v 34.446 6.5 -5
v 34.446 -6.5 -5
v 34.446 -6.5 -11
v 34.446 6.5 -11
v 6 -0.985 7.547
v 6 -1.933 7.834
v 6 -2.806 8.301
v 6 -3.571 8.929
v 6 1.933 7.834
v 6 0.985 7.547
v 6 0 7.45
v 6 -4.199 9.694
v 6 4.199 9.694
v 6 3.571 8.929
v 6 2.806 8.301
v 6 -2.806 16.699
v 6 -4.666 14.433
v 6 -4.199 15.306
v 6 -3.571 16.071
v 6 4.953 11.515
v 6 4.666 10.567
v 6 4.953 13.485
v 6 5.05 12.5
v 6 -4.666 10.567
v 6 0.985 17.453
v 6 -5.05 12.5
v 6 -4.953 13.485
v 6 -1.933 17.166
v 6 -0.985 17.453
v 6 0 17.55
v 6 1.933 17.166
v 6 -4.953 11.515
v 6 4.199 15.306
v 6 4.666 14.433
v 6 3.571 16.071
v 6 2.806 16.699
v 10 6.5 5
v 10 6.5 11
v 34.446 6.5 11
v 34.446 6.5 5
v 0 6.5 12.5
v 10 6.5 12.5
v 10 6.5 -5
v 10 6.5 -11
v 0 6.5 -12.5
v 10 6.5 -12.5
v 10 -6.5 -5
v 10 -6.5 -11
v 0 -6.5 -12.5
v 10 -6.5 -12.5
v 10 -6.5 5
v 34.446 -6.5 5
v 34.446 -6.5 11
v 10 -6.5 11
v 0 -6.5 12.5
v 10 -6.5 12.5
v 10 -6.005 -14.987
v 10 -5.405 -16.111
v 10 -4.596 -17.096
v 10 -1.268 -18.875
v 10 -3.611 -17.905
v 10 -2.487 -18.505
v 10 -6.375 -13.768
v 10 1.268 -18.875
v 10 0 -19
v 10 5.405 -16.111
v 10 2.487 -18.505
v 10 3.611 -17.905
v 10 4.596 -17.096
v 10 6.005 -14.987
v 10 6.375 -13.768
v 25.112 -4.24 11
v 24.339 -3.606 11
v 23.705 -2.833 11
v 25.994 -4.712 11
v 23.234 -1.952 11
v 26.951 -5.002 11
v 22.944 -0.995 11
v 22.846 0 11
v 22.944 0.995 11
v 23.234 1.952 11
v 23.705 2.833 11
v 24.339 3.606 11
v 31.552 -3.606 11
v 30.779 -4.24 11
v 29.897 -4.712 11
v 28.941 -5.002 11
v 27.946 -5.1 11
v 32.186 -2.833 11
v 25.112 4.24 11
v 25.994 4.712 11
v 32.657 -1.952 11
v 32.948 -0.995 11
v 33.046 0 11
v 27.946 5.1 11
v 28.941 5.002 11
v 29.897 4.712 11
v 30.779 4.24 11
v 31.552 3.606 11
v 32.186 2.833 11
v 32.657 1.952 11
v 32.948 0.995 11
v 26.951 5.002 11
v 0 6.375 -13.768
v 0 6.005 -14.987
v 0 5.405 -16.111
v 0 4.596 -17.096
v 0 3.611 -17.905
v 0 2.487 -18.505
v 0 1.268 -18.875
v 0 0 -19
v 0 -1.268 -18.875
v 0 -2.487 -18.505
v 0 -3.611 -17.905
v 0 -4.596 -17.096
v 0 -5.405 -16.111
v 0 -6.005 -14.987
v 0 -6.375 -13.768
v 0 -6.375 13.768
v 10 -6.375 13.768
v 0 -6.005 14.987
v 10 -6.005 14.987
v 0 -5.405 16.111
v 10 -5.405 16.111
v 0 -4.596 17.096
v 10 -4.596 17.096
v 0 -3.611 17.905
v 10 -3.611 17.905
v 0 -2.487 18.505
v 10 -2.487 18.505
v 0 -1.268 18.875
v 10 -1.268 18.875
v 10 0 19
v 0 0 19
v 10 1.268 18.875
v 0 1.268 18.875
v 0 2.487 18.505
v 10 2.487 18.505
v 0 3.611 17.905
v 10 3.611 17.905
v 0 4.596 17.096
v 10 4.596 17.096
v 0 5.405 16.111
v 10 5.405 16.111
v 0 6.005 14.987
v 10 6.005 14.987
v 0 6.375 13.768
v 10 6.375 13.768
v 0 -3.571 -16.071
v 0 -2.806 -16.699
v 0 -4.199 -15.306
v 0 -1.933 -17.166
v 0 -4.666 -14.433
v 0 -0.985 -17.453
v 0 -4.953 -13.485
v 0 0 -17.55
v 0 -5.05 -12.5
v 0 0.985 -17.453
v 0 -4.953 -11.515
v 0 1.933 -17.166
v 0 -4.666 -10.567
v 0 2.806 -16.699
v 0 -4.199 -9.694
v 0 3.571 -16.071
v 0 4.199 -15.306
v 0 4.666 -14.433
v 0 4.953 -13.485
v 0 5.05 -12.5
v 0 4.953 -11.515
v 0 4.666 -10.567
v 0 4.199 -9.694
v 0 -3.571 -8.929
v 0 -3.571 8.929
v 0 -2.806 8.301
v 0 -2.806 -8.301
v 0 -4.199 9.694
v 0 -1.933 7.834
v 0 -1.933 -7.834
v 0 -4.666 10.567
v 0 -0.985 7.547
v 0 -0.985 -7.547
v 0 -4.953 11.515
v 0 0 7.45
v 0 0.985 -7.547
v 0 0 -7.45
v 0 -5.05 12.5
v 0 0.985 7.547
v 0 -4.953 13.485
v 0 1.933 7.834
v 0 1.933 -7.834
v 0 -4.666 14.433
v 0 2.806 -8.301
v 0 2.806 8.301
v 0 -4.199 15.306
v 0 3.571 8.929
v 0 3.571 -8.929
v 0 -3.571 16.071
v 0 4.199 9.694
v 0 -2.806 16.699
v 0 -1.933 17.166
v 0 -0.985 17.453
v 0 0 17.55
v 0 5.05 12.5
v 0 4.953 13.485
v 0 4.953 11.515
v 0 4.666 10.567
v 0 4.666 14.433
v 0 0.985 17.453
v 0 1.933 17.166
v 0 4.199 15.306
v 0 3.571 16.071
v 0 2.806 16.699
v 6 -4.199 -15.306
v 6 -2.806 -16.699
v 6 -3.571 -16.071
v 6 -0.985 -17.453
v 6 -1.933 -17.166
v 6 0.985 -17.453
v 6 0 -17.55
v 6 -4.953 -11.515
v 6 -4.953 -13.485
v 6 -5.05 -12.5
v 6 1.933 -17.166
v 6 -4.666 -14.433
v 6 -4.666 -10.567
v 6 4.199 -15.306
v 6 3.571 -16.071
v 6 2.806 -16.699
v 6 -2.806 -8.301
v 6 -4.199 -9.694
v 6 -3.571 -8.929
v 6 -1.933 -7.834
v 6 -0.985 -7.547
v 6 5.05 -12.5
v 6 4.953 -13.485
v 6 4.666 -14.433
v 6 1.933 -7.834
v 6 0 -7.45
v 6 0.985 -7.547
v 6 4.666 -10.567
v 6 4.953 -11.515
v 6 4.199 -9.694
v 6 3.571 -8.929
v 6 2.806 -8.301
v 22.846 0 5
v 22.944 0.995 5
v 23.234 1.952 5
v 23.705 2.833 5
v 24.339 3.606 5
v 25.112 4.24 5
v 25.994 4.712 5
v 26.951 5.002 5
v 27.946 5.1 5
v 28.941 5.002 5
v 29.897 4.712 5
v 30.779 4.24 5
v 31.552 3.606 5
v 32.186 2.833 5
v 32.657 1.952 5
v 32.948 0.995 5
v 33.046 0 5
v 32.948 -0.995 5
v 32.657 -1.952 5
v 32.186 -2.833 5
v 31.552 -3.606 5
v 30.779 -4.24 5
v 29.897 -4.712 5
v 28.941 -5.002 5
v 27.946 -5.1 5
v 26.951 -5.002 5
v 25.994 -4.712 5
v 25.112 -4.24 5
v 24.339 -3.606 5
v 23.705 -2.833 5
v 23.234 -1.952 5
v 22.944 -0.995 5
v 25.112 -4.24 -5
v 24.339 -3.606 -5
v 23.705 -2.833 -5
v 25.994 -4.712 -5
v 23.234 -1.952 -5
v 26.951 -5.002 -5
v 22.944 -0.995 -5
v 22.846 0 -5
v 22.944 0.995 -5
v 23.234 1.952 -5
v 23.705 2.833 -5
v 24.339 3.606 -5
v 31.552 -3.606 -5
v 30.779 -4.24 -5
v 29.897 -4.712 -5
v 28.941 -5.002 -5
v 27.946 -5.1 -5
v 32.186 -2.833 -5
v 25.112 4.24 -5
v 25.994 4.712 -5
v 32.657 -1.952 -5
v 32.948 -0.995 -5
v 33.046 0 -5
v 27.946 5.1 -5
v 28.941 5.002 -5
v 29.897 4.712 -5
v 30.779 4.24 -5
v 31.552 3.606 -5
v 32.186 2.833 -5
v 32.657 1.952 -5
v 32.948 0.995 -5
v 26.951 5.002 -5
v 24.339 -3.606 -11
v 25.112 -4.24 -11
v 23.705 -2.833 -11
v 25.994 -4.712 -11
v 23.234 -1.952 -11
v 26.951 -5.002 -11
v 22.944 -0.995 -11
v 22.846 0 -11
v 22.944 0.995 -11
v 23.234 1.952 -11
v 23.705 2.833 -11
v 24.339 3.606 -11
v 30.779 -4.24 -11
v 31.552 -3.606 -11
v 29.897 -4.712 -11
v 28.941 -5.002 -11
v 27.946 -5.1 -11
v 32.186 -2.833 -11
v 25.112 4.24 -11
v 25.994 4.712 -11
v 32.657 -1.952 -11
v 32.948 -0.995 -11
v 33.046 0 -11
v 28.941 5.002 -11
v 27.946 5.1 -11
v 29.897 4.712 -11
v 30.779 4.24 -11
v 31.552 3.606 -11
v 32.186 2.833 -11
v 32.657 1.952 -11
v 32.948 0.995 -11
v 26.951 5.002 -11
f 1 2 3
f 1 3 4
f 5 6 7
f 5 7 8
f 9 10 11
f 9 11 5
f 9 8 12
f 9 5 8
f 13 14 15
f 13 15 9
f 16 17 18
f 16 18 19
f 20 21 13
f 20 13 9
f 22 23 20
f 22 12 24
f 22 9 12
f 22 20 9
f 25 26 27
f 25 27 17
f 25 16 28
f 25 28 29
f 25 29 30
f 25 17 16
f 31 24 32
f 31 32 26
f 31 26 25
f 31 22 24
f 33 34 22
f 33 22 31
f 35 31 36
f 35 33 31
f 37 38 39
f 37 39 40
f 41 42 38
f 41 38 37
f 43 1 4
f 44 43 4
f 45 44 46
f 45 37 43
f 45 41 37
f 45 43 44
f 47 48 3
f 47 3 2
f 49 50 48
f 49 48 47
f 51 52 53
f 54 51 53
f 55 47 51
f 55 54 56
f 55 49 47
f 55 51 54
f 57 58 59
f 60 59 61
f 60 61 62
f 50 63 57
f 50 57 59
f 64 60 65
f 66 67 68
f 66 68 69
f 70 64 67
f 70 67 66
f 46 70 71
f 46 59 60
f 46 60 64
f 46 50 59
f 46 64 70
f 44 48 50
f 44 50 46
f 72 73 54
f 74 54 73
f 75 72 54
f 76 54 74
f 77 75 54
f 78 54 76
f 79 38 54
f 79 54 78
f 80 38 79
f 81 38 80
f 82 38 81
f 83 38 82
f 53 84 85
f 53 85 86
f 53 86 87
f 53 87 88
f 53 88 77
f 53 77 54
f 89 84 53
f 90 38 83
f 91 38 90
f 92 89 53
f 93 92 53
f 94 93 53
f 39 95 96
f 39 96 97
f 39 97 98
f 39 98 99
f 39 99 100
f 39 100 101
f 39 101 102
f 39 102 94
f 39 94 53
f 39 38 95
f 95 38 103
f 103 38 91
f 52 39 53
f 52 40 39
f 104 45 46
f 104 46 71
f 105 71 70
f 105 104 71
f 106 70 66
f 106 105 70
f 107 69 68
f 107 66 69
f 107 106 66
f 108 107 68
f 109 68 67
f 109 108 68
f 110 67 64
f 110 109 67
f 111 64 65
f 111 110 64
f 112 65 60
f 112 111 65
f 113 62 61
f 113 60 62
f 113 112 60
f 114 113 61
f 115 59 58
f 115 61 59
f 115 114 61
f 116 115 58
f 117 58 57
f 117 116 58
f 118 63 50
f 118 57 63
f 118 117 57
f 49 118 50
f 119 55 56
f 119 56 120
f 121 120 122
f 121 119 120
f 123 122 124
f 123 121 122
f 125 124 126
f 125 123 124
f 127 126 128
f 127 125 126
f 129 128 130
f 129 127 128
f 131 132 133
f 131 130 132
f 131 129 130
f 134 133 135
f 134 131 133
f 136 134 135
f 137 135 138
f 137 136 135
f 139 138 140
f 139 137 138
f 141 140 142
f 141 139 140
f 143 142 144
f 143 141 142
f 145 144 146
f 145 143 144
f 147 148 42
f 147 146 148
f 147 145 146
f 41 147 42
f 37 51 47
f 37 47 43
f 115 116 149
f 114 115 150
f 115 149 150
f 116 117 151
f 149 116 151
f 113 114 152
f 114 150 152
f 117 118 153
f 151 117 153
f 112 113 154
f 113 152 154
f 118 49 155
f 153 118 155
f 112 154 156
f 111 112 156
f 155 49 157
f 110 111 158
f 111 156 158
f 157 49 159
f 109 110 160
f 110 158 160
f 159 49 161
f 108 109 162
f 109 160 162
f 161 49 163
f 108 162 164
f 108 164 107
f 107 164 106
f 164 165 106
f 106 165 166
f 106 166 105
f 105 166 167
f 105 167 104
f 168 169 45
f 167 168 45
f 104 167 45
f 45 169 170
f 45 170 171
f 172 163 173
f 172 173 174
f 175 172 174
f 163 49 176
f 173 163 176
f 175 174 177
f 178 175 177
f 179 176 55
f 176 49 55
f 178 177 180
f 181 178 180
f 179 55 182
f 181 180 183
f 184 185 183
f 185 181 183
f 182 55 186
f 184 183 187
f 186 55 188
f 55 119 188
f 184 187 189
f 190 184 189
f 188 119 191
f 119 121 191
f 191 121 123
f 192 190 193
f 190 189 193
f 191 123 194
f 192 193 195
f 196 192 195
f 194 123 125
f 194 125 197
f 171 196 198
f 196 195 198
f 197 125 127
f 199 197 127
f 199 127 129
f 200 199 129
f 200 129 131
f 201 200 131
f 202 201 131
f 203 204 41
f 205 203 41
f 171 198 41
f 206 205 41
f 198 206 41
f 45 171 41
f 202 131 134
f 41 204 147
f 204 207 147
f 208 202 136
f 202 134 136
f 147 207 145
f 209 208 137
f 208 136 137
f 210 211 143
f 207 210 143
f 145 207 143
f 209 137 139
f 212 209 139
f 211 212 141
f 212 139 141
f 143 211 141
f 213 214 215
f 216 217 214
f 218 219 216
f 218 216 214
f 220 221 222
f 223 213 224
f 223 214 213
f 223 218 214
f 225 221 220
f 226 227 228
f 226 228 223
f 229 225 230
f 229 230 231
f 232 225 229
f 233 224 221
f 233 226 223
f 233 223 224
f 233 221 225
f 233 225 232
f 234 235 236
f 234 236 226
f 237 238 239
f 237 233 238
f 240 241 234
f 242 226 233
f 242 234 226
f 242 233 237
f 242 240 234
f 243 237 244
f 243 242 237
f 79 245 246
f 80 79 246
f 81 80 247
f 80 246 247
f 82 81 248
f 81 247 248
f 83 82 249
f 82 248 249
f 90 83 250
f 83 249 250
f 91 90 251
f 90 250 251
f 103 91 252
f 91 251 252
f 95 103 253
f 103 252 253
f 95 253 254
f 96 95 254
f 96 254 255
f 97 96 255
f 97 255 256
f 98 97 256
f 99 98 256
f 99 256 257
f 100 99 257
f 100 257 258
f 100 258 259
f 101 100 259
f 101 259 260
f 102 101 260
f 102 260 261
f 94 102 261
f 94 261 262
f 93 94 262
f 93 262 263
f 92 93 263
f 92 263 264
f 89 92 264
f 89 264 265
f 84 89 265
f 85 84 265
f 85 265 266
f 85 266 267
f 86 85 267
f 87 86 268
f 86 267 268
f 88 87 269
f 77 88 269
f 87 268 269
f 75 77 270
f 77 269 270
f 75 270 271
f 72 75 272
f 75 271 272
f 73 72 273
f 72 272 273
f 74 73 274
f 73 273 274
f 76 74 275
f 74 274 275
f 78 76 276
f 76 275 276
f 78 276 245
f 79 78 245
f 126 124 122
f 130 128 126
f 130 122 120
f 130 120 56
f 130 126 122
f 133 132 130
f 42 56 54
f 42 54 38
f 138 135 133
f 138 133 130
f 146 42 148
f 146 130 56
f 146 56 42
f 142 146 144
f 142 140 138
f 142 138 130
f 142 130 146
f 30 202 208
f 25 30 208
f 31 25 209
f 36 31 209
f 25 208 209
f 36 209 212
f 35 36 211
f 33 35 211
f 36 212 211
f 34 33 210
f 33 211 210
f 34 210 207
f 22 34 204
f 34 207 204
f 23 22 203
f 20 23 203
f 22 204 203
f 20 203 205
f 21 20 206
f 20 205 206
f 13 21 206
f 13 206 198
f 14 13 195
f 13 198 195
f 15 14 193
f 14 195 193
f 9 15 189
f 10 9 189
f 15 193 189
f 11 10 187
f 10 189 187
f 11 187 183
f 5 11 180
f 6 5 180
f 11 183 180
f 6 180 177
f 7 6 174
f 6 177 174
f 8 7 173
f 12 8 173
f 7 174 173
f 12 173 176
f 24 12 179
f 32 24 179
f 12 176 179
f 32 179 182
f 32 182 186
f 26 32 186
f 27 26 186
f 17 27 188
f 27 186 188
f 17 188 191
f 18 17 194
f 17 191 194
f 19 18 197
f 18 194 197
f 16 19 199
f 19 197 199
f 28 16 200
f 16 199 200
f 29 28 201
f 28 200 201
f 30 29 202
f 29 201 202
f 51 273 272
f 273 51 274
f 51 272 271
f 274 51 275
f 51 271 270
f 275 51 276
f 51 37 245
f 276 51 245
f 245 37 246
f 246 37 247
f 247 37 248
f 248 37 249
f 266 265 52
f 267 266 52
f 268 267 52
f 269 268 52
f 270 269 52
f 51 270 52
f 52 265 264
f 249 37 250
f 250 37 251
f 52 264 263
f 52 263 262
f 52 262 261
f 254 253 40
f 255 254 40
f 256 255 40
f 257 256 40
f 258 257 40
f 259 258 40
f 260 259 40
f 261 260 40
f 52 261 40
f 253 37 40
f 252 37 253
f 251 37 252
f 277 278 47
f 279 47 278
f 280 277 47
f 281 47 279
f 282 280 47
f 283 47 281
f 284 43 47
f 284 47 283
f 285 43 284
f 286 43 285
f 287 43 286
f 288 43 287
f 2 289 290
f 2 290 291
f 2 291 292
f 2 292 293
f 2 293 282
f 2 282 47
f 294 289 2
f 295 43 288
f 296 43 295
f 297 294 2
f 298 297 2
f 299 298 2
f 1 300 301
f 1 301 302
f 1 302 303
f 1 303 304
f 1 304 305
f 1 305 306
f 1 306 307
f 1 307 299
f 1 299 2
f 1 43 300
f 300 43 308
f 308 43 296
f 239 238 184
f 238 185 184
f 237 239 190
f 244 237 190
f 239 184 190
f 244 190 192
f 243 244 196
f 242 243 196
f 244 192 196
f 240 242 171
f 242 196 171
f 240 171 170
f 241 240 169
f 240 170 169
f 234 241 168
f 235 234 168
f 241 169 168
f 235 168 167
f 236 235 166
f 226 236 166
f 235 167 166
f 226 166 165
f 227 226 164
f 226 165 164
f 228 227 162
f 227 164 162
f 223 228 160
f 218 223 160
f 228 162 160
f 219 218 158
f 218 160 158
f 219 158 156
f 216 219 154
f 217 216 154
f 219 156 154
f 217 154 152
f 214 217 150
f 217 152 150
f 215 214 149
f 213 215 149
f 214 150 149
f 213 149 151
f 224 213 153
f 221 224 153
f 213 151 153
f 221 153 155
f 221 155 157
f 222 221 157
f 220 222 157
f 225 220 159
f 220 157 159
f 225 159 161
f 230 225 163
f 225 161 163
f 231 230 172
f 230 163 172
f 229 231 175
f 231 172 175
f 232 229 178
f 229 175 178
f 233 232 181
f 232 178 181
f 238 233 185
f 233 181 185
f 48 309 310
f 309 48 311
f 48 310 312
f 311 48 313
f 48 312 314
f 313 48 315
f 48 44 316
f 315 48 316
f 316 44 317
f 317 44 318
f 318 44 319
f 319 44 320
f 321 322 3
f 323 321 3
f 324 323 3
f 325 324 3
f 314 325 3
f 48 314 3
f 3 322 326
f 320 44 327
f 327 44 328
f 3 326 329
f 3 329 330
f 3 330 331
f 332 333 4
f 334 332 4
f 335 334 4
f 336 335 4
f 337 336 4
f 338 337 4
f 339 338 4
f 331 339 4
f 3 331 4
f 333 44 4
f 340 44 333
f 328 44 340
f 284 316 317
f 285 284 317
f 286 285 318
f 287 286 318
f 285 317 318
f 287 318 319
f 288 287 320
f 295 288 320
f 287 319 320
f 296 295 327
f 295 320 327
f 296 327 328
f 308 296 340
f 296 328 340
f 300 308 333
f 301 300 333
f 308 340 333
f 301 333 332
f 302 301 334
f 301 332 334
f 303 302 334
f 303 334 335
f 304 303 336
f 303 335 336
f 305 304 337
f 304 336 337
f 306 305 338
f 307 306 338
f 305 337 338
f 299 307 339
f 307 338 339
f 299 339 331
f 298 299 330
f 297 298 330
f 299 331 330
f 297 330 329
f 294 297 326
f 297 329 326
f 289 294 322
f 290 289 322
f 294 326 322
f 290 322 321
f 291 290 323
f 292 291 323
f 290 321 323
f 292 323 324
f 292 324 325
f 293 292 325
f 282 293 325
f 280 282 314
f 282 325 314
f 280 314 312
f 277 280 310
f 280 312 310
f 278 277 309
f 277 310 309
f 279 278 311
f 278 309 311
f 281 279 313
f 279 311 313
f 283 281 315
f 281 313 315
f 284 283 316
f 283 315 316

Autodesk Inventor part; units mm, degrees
sketch "Skizze1" plane through (0, 0, 0) normal (1, 0, 0) x (0, 1, 0)
  circle A0 centre (0, 12.5) radius 6.5
  circle A1 centre (0, -12.5) radius 6.5
  line L0 (6.5, 12.5) -> (6.5, -12.5)
  line L1 (-6.5, -12.5) -> (-6.5, 12.5)
  point P0 (0, 0)
  dimension "d0" = 13
  dimension "d1" = 13
  dimension "d2" = 12.5
  dimension "d3" = 12.5
extrude "Extrusion1" add sketch "Skizze1" along normal blind 10
sketch "Skizze2" plane through (0, 0, 0) normal (-1, 0, 0) x (0, 0, 1)
  arc A0 (-12.5, 6.5) -> (-12.5, -6.5) centre (-12.5, 0) ccw projected
  circle A1 centre (-12.5, 0) radius 5.05
  arc A2 (12.5, -6.5) -> (12.5, 6.5) centre (12.5, 0) ccw projected
  circle A3 centre (12.5, 0) radius 5.05
  point P0 (0, 0)
  dimension "d8" = 10.1
  dimension "d9" = 10.1
extrude "Extrusion2" cut sketch "Skizze2" against normal blind 6
ref_plane "Arbeitsebene1" through (0, 0, 5) normal (0, 0, 1) x (1, 0, 0)
sketch "Skizze4" plane through (0, 0, 5) normal (0, 0, 1) x (1, 0, 0)
  line L0 (10, -6.5) -> (10, 6.5) projected
  line L1 (27.9456, 6.5) -> (10, 6.5)
  line L2 (27.9456, -6.5) -> (10, -6.5)
  line L3 (0, -6.5) -> (0, 6.5) projected
  line L4 (27.9456, 6.5) -> (34.4456, 6.5)
  line L5 (34.4456, 6.5) -> (34.4456, -6.5)
  line L6 (34.4456, -6.5) -> (27.9456, -6.5)
  point P0 (0, 0)
  point P1 (0, 0)
extrude "Extrusion3" add sketch "Skizze4" along normal blind 6
ref_plane "Arbeitsebene2" through (0, 0, -5) normal (0, 0, 1) x (1, 0, 0)
sketch "Skizze5" plane through (0, 0, -5) normal (0, 0, 1) x (1, 0, 0)
  line L0 (34.4456, 6.5) -> (10, 6.5) projected
  line L1 (10, 6.5) -> (10, -6.5) projected
  line L2 (27.9456, 6.5) -> (10, 6.5)
  line L3 (10, -6.5) -> (34.4456, -6.5) projected
  line L4 (27.9456, -6.5) -> (10, -6.5)
  line L5 (34.4456, -6.5) -> (34.4456, 6.5) projected
  line L6 (27.9456, 6.5) -> (34.4456, 6.5)
  line L7 (34.4456, 6.5) -> (34.4456, -6.5)
  line L8 (34.4456, -6.5) -> (27.9456, -6.5)
  point P0 (0, 0)
  point P1 (27.9456, 0)
  dimension "d26" = 24.4456
  dimension "d27" = 13
extrude "Extrusion4" add sketch "Skizze5" against normal blind 6
sketch "Skizze6" plane through (0, 0, -11) normal (0, 0, -1) x (-1, 0, 0)
  arc A0 (-27.9456, 6.5) -> (-27.9456, -6.5) centre (-27.9456, 0) ccw projected
  circle A1 centre (-27.9456, 0) radius 5.1
  point P0 (0, 0)
  dimension "d20" = 10.2
extrude "Extrusion5" cut sketch "Skizze6" against normal through all
ref_plane "Arbeitsebene3" through (0, 0, 0) normal (0, 1, 0) x (-1, 0, 0)
ref_plane "Arbeitsebene4" through (0, 0, 0) normal (0, 0, 1) x (1, 0, 0)
properties part number "ObenMotor"
